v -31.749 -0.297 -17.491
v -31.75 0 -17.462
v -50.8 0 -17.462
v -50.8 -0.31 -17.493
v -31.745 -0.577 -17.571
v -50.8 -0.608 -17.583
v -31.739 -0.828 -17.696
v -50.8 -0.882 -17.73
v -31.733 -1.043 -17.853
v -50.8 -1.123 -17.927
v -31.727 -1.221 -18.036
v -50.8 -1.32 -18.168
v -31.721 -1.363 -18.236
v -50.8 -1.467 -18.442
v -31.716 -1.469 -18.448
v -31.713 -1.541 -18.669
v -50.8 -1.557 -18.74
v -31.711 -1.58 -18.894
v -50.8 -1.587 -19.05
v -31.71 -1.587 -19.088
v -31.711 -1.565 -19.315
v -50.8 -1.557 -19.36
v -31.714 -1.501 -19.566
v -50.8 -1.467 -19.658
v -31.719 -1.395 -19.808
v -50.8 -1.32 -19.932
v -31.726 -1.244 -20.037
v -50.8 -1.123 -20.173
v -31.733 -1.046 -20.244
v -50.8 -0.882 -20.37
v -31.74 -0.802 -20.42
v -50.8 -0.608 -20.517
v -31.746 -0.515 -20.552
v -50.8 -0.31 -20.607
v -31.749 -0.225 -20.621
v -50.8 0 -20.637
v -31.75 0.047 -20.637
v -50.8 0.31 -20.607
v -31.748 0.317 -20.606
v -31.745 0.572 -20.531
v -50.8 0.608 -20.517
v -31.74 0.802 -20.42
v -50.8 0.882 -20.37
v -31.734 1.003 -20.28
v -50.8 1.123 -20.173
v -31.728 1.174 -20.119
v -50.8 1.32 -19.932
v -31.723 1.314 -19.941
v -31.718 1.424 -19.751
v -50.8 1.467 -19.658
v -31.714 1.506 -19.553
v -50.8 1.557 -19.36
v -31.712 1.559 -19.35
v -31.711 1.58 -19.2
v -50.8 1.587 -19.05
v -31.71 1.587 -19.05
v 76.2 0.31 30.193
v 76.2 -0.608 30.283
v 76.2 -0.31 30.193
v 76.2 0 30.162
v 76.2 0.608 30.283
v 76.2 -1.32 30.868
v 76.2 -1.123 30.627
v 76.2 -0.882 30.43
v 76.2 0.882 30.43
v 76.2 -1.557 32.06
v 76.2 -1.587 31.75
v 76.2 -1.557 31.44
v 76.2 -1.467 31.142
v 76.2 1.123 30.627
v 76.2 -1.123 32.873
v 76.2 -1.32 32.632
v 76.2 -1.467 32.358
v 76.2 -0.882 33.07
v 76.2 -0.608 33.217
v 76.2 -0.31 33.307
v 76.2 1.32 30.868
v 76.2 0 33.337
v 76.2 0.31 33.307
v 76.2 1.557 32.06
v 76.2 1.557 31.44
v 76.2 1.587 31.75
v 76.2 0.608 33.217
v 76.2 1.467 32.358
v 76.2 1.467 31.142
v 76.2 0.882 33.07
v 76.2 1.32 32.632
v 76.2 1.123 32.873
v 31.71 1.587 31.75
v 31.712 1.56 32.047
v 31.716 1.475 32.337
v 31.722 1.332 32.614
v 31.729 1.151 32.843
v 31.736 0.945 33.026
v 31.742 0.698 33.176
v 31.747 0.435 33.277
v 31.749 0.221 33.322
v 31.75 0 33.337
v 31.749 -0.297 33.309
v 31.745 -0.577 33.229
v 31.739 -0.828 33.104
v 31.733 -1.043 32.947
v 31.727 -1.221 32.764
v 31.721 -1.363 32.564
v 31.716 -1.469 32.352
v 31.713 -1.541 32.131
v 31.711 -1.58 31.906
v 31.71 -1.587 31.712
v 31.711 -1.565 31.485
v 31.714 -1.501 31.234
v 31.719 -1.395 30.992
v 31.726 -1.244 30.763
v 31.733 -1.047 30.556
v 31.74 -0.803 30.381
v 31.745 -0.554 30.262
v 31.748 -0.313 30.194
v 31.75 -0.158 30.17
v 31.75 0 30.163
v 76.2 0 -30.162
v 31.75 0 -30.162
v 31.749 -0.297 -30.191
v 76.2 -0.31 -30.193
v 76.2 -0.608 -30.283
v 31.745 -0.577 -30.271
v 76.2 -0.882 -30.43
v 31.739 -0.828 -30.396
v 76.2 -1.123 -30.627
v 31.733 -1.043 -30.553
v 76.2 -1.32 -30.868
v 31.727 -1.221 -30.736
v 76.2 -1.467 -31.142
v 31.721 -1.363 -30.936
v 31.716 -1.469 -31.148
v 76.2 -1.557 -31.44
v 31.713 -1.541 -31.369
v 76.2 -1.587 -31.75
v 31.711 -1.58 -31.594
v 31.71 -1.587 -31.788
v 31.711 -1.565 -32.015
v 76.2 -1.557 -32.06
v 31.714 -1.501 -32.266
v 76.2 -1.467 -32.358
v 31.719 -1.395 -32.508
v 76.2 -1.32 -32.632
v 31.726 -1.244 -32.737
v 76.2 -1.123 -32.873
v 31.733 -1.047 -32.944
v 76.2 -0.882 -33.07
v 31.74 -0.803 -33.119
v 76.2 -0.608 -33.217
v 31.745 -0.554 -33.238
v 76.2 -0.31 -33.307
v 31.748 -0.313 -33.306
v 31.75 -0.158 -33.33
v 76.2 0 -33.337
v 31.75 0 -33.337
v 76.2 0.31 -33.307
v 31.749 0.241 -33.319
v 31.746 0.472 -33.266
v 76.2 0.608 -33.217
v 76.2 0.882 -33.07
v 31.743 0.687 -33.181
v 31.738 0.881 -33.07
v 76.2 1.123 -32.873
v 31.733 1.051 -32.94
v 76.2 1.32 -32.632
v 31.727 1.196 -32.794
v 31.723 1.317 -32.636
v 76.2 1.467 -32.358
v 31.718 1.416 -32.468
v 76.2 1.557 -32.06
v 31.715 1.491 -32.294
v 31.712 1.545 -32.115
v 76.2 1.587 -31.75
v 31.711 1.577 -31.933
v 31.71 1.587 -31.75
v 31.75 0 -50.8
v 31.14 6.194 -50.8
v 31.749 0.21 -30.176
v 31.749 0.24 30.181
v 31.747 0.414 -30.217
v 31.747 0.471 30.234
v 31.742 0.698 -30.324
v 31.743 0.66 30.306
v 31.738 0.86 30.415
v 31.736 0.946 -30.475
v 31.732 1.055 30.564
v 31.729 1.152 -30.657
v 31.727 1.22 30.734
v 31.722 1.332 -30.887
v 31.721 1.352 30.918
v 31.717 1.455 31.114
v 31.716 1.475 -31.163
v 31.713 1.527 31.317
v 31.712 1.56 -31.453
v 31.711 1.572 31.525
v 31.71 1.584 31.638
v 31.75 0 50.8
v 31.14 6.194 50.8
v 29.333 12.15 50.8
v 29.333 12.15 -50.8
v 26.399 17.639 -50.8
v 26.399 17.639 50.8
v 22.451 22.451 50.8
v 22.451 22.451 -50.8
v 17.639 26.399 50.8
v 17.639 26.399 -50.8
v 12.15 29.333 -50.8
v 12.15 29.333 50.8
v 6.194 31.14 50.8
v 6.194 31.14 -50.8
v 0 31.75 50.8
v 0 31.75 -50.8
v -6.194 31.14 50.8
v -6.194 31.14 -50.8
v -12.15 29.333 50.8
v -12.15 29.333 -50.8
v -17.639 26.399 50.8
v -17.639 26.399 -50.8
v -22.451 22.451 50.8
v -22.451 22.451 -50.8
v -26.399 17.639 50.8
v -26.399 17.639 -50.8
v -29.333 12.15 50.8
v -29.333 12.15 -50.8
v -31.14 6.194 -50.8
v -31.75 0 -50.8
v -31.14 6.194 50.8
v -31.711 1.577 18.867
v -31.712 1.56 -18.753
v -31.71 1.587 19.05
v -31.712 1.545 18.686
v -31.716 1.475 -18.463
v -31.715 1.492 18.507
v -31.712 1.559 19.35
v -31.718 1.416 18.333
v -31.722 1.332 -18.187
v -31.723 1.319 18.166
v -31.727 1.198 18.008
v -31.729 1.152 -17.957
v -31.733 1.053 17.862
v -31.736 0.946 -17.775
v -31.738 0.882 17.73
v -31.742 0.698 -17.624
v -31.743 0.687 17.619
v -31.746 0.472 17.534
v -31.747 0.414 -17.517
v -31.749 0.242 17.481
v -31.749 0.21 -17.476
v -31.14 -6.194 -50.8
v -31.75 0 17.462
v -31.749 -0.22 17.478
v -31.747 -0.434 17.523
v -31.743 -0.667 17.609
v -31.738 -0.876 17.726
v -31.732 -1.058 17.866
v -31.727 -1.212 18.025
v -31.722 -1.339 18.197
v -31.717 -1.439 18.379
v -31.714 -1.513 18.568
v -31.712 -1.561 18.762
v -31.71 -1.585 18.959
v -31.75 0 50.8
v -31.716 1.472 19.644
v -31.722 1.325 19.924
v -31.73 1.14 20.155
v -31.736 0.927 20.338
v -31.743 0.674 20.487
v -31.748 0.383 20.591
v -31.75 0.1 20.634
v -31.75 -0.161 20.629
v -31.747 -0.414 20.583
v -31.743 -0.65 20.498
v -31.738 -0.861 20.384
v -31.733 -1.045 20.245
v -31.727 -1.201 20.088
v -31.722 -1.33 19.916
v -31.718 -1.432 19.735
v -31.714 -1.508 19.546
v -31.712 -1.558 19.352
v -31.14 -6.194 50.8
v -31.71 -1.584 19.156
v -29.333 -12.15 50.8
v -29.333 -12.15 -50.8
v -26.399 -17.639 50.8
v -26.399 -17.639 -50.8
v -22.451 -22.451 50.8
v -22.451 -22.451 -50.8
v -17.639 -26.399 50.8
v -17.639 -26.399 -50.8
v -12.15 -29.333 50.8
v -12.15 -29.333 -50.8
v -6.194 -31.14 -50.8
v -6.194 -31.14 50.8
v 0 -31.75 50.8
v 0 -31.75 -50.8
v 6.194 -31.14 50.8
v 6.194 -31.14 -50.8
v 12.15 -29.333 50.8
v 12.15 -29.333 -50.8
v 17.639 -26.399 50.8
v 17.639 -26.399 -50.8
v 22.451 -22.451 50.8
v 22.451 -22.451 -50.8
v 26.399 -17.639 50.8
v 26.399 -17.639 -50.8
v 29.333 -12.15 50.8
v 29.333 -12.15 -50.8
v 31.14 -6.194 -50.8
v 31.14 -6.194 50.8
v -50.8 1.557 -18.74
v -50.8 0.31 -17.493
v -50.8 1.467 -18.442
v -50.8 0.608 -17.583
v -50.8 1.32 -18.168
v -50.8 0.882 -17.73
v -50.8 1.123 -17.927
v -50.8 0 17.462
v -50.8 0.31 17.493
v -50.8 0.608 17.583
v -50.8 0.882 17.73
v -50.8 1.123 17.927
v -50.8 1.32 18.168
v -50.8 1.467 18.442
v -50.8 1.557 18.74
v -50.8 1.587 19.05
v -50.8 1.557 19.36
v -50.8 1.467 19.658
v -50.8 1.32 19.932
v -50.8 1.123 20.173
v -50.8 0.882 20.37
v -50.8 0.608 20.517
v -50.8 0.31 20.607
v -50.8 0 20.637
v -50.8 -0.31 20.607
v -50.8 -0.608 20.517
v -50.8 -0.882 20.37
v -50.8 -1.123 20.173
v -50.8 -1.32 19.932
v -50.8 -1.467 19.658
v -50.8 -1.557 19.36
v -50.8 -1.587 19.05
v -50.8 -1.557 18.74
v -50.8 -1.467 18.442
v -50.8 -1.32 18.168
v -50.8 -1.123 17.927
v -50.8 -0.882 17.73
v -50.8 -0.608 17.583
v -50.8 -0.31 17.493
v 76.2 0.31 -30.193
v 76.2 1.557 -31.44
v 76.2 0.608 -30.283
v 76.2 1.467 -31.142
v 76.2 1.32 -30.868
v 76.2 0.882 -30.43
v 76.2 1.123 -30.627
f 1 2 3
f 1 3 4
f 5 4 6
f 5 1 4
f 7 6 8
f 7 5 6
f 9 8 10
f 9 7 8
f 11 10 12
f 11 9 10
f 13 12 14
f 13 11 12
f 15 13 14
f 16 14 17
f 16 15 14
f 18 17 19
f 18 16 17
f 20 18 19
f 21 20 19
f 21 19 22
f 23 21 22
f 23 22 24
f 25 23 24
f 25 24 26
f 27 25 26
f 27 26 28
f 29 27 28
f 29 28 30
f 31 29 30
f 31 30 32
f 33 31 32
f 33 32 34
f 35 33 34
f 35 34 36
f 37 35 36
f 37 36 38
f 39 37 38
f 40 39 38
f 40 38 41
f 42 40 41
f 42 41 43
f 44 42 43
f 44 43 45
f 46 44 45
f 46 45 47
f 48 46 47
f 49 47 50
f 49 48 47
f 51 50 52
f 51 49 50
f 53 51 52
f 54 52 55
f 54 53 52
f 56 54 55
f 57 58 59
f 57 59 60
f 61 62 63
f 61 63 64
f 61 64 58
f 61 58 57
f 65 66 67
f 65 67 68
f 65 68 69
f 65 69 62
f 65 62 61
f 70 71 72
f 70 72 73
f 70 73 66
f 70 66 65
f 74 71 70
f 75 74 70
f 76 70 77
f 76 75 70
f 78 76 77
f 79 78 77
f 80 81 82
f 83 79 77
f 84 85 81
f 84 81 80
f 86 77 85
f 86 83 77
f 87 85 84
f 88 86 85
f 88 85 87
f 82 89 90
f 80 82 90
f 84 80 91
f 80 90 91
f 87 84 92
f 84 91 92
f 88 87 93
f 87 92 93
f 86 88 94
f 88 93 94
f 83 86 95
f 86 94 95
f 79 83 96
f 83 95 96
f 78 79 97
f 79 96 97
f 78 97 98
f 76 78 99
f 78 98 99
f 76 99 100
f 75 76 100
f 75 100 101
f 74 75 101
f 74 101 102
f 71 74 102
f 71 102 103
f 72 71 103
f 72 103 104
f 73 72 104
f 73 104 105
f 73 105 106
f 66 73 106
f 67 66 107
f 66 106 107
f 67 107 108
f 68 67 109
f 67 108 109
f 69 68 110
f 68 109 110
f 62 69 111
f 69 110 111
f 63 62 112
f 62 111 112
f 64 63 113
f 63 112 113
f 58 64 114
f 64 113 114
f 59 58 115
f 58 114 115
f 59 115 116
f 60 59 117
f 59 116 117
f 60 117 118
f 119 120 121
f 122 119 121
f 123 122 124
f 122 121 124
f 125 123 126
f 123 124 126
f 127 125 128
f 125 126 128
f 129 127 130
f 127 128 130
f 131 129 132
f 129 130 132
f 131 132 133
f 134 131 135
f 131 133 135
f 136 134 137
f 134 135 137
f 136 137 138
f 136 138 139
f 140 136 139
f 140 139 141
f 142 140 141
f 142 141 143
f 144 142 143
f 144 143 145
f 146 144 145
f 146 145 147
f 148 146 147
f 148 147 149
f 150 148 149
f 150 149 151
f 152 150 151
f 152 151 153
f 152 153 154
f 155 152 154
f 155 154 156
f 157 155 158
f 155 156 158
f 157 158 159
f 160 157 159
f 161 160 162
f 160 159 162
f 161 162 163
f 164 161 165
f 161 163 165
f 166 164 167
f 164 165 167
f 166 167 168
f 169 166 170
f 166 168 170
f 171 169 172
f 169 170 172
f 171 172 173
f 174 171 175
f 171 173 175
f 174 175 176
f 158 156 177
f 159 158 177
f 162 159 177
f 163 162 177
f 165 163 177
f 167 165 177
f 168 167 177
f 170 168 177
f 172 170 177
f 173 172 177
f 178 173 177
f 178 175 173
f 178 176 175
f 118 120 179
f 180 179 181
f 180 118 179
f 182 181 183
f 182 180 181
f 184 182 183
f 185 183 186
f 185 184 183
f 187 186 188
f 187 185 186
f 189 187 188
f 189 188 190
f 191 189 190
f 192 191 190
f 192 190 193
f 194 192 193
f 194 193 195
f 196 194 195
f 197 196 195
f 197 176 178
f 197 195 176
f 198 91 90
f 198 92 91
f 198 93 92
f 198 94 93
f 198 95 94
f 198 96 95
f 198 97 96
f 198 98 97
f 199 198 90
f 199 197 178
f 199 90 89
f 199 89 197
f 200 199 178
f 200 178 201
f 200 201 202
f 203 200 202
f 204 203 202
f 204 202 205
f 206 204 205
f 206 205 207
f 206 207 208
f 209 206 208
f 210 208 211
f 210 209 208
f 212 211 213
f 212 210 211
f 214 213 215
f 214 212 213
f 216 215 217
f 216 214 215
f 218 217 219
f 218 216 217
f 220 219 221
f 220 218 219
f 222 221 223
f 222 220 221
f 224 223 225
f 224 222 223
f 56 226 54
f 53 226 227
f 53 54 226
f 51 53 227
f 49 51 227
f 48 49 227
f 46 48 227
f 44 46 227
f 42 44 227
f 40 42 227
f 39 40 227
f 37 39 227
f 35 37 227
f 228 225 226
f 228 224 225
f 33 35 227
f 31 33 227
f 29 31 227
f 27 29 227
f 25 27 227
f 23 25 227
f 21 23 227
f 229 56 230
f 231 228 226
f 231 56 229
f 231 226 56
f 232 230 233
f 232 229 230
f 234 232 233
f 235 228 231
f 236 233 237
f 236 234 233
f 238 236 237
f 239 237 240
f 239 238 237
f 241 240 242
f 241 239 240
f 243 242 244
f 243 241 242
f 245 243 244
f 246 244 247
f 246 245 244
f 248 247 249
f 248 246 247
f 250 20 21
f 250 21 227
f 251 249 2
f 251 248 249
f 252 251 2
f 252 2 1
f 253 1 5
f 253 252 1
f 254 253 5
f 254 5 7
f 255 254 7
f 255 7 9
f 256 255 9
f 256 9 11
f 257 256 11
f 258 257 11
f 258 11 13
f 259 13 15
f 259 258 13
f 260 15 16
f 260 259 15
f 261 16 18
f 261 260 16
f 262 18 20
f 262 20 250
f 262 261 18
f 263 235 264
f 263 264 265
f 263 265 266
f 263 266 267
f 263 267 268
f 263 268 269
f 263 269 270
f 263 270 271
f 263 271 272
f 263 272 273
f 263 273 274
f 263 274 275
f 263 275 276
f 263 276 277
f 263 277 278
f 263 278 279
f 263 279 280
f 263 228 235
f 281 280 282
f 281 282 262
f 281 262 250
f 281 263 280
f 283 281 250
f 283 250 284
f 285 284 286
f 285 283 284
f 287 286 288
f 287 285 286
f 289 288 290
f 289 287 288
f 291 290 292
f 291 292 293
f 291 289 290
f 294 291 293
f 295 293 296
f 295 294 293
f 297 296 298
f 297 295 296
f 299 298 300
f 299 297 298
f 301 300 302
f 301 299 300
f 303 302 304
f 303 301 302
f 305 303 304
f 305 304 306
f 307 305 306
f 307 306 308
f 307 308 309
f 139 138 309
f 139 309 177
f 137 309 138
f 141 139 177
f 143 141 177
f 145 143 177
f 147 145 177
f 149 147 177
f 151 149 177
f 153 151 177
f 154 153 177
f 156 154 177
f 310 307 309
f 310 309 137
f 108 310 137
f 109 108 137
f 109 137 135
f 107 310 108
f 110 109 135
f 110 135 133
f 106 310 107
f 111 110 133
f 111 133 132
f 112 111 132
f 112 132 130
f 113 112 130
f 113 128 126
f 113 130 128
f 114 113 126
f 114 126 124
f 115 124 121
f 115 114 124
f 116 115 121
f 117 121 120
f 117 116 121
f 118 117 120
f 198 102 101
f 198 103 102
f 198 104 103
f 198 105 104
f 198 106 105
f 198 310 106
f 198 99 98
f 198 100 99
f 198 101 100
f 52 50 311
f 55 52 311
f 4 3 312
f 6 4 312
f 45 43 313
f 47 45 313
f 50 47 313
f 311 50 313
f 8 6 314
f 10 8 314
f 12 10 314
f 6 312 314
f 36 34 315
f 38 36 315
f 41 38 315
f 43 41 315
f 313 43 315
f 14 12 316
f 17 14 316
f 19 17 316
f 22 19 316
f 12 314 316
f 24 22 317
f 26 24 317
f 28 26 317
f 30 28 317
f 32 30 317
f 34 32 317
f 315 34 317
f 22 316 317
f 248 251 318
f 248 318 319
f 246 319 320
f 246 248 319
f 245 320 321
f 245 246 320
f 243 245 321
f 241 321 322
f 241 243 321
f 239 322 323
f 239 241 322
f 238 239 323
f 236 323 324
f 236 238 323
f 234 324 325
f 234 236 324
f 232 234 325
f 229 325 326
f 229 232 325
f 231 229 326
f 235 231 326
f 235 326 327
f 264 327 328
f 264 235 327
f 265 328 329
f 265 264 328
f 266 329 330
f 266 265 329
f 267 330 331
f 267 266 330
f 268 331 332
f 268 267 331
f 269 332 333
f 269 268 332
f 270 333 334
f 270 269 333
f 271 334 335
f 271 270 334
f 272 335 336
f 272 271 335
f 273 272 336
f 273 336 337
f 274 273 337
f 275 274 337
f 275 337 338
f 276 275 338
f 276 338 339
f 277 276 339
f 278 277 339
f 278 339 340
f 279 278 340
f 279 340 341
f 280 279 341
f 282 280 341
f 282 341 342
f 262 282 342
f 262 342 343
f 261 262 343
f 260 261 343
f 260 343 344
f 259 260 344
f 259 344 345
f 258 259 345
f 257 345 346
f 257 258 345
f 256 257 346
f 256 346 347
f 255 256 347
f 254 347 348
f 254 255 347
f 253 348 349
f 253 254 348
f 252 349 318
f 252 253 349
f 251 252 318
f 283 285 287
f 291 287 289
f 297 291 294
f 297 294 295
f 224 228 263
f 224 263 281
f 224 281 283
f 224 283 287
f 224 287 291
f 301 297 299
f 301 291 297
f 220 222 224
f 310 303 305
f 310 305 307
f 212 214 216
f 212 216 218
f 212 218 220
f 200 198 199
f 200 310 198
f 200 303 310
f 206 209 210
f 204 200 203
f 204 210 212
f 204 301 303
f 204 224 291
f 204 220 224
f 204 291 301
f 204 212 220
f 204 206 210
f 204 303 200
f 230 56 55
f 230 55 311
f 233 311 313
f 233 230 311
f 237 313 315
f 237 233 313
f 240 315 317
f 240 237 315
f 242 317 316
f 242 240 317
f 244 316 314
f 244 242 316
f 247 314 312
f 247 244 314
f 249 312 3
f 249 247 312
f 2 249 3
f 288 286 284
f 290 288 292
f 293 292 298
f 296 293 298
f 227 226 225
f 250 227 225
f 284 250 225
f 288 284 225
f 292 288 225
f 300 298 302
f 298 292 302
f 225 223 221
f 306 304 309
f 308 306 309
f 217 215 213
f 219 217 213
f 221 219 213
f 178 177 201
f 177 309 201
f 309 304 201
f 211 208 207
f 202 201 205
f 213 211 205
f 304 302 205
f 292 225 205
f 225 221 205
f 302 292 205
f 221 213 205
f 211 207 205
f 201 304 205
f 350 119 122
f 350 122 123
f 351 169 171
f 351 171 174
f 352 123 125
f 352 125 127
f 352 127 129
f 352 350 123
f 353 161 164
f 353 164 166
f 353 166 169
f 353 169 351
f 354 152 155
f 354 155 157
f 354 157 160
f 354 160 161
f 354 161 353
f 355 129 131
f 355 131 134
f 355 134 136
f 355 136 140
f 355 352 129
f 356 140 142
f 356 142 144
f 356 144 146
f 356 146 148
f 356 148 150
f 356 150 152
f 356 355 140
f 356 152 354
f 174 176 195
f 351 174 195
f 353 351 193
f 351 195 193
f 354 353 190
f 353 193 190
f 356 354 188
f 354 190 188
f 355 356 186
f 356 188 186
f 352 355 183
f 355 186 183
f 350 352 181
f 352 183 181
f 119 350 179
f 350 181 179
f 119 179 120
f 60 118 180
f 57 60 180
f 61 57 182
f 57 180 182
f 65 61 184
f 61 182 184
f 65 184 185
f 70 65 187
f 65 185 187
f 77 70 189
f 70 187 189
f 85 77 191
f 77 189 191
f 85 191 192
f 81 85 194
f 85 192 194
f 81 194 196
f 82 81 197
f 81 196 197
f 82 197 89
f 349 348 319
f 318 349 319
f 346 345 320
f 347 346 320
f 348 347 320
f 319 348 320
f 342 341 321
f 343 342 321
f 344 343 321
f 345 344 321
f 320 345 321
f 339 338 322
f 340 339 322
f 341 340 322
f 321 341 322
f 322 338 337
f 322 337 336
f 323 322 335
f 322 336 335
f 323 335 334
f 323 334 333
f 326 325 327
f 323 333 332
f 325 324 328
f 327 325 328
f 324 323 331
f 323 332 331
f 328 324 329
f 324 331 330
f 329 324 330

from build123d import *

# Parameters (mm, degrees)
F0_R          = 31.75
F1_DEPTH      = 50.8
F1_DEPTH_BACK = 50.8
F3_DEPTH      = 76.2
F5_DEPTH      = 50.8


with BuildPart() as f1:
    # F0 (on Top) → F1 (new body, two sides)
    with BuildSketch(Plane.XY) as f1_sk:
        Circle(F0_R)
    extrude(amount=F1_DEPTH)
    extrude(f1_sk.sketch, amount=-F1_DEPTH_BACK)

    # F2 (on Right) → F3 (join)
    with BuildSketch(Plane.YZ):
        with BuildLine():
            ThreePointArc((1.5875, -31.75), (1.122532, -30.627468), (0, -30.1625))
            ThreePointArc((0, -30.1625), (-1.122532, -32.872532), (1.5875, -31.75))
        make_face()
        with BuildLine():
            ThreePointArc((1.5875, 31.75), (-1.122532, 32.872532), (0, 30.1625))
            ThreePointArc((0, 30.1625), (1.122532, 30.627468), (1.5875, 31.75))
        make_face()
    extrude(amount=F3_DEPTH)

    # F4 (on Right) → F5 (join)
    with BuildSketch(Plane.YZ):
        with BuildLine():
            ThreePointArc((1.5875, 19.05), (-1.122532, 20.172532), (0, 17.4625))
            ThreePointArc((0, 17.4625), (1.122532, 17.927468), (1.5875, 19.05))
        make_face()
        with BuildLine():
            ThreePointArc((1.5875, -19.05), (1.122532, -17.927468), (0, -17.4625))
            ThreePointArc((0, -17.4625), (-1.122532, -20.172532), (1.5875, -19.05))
        make_face()
    extrude(amount=-F5_DEPTH)


solid = f1.part
